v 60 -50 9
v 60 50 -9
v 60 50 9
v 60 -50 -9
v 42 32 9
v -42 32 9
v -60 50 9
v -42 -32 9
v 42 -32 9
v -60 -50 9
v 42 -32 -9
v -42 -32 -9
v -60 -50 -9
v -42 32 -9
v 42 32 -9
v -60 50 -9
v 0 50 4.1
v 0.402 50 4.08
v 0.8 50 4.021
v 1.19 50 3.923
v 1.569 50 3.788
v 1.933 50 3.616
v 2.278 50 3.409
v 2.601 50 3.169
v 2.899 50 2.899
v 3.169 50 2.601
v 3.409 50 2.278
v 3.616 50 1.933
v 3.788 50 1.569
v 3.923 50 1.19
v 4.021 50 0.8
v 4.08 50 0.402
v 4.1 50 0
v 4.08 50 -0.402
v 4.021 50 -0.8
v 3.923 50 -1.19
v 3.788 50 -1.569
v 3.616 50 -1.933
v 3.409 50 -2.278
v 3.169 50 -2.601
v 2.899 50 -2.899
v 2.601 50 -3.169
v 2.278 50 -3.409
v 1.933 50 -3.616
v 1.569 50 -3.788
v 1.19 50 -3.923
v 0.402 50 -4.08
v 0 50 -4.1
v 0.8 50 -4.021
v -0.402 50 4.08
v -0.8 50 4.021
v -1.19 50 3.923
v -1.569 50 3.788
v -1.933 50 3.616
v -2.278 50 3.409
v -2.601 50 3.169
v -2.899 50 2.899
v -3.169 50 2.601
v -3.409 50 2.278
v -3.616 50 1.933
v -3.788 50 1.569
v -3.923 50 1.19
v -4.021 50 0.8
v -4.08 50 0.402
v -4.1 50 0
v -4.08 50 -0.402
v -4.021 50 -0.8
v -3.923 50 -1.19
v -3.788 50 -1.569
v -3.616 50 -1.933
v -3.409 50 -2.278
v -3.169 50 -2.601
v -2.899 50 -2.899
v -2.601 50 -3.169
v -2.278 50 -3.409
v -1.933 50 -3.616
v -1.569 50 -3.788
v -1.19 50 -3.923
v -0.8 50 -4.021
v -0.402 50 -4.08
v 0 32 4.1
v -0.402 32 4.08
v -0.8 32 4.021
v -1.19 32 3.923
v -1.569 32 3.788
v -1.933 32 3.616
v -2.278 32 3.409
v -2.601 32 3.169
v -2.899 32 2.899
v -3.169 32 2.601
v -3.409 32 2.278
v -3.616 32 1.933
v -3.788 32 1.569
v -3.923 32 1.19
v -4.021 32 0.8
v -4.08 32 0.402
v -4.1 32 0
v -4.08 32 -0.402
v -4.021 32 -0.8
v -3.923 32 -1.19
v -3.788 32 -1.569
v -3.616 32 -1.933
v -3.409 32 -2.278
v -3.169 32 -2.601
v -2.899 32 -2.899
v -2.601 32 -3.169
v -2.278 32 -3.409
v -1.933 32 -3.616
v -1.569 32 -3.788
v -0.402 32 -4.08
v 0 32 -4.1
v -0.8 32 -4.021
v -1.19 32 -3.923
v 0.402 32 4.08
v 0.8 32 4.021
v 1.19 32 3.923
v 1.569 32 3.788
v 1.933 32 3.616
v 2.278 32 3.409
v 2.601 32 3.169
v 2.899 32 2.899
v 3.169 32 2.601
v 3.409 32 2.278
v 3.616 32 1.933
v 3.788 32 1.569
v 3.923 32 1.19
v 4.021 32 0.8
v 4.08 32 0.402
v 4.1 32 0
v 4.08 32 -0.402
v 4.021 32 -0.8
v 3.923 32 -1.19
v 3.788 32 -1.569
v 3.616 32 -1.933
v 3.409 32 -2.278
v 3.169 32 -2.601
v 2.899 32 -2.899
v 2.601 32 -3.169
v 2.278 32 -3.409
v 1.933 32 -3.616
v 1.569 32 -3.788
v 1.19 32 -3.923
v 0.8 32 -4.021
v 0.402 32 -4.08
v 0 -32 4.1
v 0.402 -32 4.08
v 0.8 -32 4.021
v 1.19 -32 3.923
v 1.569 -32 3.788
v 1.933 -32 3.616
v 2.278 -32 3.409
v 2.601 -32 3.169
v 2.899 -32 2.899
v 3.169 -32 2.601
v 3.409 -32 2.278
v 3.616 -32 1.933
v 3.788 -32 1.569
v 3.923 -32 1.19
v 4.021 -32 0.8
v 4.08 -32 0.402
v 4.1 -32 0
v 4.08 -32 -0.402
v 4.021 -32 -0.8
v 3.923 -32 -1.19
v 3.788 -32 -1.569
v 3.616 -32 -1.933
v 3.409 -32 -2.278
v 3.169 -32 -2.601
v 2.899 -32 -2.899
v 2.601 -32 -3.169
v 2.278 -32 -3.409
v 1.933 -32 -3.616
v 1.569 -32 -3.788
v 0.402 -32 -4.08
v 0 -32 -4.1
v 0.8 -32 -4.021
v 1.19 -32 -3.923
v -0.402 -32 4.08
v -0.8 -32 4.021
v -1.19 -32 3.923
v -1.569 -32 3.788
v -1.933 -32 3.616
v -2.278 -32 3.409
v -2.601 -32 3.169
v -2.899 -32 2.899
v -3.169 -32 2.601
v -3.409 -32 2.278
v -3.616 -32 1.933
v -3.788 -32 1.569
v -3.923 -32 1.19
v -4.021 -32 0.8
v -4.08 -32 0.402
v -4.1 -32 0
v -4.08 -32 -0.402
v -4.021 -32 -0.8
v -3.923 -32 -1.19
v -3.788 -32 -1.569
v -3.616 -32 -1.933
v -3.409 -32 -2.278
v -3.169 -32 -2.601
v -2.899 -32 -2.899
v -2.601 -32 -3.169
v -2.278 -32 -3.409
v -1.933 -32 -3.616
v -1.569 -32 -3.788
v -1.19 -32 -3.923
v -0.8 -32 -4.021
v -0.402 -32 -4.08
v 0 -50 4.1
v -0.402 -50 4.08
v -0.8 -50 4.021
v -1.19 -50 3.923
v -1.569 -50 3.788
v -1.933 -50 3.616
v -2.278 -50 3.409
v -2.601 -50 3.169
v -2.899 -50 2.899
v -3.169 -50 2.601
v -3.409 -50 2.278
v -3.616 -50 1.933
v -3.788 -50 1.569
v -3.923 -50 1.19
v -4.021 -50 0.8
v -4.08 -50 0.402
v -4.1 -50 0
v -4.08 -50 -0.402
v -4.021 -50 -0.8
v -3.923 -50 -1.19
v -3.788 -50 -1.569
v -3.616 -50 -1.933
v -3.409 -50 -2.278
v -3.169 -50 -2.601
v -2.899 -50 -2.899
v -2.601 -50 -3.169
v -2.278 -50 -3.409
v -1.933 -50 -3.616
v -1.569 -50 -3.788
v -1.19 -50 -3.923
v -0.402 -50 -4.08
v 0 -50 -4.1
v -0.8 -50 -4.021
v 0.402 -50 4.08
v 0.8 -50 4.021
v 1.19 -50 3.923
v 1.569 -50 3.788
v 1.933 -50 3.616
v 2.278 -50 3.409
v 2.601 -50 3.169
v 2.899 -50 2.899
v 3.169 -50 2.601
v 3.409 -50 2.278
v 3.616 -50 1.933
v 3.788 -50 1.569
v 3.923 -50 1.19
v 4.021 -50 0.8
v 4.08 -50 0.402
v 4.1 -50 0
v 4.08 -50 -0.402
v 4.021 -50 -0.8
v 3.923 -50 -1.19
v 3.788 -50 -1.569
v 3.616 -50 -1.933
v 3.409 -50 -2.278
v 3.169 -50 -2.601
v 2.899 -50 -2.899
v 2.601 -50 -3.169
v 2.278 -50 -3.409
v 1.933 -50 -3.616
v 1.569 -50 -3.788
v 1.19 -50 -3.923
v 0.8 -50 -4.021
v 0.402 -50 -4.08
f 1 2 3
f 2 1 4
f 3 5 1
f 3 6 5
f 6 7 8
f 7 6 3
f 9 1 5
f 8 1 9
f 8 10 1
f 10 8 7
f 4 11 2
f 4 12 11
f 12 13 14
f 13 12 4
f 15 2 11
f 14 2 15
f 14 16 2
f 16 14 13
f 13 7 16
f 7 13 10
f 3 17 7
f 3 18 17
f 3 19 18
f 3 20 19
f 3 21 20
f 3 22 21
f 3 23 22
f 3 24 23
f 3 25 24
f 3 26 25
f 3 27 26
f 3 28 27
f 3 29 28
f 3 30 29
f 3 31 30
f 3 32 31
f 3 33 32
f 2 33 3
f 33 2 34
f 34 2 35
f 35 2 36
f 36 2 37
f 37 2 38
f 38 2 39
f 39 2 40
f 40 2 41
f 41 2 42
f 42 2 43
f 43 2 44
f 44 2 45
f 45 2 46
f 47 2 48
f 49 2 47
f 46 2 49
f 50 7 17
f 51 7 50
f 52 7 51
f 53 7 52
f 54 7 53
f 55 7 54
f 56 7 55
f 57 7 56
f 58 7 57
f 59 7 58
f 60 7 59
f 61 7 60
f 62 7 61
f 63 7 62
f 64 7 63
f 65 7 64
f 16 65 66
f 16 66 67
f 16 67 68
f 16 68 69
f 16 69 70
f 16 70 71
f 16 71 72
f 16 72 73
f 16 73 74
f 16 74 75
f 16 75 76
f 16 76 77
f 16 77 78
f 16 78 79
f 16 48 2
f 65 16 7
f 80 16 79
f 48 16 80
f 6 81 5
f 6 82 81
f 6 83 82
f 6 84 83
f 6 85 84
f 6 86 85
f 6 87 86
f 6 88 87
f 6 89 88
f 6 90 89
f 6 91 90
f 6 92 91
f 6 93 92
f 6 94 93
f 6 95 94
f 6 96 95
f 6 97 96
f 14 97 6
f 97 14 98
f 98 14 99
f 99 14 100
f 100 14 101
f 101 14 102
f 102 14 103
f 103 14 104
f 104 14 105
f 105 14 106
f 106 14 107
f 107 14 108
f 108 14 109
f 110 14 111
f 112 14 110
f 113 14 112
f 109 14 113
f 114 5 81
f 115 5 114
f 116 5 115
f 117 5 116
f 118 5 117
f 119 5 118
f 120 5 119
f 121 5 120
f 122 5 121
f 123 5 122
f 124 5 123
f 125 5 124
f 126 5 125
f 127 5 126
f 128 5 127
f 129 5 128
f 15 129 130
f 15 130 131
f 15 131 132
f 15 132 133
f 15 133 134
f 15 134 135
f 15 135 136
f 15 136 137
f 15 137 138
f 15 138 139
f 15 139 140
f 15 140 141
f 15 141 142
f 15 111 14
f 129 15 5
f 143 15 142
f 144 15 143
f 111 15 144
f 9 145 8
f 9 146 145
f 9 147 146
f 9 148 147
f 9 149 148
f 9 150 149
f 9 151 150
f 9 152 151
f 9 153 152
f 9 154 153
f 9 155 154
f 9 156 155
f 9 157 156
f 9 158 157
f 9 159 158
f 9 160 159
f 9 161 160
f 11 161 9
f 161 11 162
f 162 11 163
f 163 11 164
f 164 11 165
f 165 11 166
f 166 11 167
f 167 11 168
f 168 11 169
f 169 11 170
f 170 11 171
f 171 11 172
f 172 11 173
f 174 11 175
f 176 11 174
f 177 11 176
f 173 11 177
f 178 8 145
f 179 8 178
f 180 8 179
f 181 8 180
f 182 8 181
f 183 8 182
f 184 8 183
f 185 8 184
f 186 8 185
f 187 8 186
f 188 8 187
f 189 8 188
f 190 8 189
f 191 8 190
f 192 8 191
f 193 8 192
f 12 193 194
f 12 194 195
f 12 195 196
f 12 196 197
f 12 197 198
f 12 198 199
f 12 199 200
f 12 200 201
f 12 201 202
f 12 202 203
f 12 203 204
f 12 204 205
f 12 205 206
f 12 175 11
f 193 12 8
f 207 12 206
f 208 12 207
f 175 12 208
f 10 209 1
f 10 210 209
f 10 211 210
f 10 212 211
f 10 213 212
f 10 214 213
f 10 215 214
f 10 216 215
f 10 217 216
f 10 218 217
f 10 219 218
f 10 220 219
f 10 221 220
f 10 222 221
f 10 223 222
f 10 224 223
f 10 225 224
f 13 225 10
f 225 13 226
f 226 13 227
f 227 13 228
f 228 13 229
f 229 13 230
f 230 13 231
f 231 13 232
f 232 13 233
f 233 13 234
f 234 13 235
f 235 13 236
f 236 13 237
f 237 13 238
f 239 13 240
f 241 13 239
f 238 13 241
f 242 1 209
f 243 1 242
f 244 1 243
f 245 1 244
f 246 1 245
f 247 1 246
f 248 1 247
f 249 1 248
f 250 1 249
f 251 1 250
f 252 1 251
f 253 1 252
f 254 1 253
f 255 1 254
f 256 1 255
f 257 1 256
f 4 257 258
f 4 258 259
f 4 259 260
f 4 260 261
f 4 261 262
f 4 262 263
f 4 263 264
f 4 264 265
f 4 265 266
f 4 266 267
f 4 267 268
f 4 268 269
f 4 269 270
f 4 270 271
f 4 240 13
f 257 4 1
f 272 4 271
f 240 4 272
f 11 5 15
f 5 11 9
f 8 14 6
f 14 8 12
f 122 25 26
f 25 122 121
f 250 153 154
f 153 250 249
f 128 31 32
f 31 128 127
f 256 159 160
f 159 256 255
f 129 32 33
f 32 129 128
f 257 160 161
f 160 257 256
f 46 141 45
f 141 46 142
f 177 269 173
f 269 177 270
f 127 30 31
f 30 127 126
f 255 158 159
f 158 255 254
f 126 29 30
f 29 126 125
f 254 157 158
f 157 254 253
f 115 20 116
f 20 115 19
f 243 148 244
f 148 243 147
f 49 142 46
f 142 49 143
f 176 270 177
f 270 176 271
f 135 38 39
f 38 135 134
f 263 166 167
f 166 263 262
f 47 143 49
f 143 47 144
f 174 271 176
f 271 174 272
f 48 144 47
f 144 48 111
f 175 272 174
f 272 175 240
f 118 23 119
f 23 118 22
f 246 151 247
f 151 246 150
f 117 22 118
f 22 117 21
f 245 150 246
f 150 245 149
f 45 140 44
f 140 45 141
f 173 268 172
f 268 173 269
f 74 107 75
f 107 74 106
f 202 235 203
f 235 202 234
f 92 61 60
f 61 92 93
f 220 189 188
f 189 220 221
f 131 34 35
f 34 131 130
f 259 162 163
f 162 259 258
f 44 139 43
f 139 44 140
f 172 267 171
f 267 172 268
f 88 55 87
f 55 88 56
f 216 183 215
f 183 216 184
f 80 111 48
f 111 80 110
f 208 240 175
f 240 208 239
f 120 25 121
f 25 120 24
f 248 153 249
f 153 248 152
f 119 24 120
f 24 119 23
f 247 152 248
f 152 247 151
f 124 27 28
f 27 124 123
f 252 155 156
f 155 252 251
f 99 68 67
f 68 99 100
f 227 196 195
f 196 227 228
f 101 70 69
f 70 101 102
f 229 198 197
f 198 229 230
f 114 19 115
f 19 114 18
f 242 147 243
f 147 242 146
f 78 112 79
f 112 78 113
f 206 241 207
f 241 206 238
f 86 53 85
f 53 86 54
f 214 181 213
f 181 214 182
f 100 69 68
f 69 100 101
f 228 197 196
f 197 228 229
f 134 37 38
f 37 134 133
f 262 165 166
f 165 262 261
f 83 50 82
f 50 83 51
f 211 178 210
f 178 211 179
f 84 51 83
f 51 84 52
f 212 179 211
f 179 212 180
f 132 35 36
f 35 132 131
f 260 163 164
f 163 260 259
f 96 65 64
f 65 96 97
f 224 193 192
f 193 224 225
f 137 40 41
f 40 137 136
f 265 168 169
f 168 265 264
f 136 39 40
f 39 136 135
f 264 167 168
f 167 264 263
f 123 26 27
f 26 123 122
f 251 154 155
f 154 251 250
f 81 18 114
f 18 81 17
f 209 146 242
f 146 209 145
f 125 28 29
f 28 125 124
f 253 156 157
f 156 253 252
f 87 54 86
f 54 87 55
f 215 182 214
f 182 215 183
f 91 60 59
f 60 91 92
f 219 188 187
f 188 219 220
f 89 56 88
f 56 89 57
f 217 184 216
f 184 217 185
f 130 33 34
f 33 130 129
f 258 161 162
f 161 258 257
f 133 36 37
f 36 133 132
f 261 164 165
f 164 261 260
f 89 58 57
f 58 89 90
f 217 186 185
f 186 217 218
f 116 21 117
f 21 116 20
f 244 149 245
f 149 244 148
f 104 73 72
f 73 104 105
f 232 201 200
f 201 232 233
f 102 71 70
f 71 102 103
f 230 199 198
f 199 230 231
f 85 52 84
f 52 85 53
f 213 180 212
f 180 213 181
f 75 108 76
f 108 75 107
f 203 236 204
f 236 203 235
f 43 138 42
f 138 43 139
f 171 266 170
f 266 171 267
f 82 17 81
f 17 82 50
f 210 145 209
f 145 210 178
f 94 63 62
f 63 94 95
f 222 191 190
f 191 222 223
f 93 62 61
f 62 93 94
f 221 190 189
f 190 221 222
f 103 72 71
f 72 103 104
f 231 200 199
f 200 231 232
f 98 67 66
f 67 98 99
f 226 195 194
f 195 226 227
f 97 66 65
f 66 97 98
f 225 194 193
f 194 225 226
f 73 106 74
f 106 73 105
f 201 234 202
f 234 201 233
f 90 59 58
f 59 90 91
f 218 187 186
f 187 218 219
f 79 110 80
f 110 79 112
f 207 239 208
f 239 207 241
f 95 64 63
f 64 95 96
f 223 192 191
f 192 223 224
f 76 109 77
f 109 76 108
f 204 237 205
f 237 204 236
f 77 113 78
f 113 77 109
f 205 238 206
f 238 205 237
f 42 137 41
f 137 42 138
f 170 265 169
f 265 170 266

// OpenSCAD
// file: parameters.scad
// 135er Universal Helicopter Controller - Cyclic V1 parameters
$fn = 64;

base_x = 220;
base_y = 180;
base_h = 18;
wall = 5;

shaft_d = 8.2;
bearing_od = 22.2;
bearing_w = 7.2;

gimbal_outer_x = 120;
gimbal_outer_y = 100;
gimbal_bar = 18;
gimbal_h = 18;

tube_od = 22.2;
tube_clamp_wall = 6;

sensor_board_x = 23;
sensor_board_y = 23;
sensor_gap = 2.0;

m4_clearance = 4.4;
m3_clearance = 3.4;
// main file
include <parameters.scad>;

module bar_x(len){
    cube([len,gimbal_bar,gimbal_h],center=true);
}
module bar_y(len){
    cube([gimbal_bar,len,gimbal_h],center=true);
}

difference(){
    union(){
        translate([0,(gimbal_outer_y-gimbal_bar)/2,0]) bar_x(gimbal_outer_x);
        translate([0,-(gimbal_outer_y-gimbal_bar)/2,0]) bar_x(gimbal_outer_x);
        translate([(gimbal_outer_x-gimbal_bar)/2,0,0]) bar_y(gimbal_outer_y);
        translate([-(gimbal_outer_x-gimbal_bar)/2,0,0]) bar_y(gimbal_outer_y);
    }

    // Roll shaft bores.
    rotate([90,0,0])
        cylinder(h=gimbal_outer_y+20,d=shaft_d,center=true);
}
